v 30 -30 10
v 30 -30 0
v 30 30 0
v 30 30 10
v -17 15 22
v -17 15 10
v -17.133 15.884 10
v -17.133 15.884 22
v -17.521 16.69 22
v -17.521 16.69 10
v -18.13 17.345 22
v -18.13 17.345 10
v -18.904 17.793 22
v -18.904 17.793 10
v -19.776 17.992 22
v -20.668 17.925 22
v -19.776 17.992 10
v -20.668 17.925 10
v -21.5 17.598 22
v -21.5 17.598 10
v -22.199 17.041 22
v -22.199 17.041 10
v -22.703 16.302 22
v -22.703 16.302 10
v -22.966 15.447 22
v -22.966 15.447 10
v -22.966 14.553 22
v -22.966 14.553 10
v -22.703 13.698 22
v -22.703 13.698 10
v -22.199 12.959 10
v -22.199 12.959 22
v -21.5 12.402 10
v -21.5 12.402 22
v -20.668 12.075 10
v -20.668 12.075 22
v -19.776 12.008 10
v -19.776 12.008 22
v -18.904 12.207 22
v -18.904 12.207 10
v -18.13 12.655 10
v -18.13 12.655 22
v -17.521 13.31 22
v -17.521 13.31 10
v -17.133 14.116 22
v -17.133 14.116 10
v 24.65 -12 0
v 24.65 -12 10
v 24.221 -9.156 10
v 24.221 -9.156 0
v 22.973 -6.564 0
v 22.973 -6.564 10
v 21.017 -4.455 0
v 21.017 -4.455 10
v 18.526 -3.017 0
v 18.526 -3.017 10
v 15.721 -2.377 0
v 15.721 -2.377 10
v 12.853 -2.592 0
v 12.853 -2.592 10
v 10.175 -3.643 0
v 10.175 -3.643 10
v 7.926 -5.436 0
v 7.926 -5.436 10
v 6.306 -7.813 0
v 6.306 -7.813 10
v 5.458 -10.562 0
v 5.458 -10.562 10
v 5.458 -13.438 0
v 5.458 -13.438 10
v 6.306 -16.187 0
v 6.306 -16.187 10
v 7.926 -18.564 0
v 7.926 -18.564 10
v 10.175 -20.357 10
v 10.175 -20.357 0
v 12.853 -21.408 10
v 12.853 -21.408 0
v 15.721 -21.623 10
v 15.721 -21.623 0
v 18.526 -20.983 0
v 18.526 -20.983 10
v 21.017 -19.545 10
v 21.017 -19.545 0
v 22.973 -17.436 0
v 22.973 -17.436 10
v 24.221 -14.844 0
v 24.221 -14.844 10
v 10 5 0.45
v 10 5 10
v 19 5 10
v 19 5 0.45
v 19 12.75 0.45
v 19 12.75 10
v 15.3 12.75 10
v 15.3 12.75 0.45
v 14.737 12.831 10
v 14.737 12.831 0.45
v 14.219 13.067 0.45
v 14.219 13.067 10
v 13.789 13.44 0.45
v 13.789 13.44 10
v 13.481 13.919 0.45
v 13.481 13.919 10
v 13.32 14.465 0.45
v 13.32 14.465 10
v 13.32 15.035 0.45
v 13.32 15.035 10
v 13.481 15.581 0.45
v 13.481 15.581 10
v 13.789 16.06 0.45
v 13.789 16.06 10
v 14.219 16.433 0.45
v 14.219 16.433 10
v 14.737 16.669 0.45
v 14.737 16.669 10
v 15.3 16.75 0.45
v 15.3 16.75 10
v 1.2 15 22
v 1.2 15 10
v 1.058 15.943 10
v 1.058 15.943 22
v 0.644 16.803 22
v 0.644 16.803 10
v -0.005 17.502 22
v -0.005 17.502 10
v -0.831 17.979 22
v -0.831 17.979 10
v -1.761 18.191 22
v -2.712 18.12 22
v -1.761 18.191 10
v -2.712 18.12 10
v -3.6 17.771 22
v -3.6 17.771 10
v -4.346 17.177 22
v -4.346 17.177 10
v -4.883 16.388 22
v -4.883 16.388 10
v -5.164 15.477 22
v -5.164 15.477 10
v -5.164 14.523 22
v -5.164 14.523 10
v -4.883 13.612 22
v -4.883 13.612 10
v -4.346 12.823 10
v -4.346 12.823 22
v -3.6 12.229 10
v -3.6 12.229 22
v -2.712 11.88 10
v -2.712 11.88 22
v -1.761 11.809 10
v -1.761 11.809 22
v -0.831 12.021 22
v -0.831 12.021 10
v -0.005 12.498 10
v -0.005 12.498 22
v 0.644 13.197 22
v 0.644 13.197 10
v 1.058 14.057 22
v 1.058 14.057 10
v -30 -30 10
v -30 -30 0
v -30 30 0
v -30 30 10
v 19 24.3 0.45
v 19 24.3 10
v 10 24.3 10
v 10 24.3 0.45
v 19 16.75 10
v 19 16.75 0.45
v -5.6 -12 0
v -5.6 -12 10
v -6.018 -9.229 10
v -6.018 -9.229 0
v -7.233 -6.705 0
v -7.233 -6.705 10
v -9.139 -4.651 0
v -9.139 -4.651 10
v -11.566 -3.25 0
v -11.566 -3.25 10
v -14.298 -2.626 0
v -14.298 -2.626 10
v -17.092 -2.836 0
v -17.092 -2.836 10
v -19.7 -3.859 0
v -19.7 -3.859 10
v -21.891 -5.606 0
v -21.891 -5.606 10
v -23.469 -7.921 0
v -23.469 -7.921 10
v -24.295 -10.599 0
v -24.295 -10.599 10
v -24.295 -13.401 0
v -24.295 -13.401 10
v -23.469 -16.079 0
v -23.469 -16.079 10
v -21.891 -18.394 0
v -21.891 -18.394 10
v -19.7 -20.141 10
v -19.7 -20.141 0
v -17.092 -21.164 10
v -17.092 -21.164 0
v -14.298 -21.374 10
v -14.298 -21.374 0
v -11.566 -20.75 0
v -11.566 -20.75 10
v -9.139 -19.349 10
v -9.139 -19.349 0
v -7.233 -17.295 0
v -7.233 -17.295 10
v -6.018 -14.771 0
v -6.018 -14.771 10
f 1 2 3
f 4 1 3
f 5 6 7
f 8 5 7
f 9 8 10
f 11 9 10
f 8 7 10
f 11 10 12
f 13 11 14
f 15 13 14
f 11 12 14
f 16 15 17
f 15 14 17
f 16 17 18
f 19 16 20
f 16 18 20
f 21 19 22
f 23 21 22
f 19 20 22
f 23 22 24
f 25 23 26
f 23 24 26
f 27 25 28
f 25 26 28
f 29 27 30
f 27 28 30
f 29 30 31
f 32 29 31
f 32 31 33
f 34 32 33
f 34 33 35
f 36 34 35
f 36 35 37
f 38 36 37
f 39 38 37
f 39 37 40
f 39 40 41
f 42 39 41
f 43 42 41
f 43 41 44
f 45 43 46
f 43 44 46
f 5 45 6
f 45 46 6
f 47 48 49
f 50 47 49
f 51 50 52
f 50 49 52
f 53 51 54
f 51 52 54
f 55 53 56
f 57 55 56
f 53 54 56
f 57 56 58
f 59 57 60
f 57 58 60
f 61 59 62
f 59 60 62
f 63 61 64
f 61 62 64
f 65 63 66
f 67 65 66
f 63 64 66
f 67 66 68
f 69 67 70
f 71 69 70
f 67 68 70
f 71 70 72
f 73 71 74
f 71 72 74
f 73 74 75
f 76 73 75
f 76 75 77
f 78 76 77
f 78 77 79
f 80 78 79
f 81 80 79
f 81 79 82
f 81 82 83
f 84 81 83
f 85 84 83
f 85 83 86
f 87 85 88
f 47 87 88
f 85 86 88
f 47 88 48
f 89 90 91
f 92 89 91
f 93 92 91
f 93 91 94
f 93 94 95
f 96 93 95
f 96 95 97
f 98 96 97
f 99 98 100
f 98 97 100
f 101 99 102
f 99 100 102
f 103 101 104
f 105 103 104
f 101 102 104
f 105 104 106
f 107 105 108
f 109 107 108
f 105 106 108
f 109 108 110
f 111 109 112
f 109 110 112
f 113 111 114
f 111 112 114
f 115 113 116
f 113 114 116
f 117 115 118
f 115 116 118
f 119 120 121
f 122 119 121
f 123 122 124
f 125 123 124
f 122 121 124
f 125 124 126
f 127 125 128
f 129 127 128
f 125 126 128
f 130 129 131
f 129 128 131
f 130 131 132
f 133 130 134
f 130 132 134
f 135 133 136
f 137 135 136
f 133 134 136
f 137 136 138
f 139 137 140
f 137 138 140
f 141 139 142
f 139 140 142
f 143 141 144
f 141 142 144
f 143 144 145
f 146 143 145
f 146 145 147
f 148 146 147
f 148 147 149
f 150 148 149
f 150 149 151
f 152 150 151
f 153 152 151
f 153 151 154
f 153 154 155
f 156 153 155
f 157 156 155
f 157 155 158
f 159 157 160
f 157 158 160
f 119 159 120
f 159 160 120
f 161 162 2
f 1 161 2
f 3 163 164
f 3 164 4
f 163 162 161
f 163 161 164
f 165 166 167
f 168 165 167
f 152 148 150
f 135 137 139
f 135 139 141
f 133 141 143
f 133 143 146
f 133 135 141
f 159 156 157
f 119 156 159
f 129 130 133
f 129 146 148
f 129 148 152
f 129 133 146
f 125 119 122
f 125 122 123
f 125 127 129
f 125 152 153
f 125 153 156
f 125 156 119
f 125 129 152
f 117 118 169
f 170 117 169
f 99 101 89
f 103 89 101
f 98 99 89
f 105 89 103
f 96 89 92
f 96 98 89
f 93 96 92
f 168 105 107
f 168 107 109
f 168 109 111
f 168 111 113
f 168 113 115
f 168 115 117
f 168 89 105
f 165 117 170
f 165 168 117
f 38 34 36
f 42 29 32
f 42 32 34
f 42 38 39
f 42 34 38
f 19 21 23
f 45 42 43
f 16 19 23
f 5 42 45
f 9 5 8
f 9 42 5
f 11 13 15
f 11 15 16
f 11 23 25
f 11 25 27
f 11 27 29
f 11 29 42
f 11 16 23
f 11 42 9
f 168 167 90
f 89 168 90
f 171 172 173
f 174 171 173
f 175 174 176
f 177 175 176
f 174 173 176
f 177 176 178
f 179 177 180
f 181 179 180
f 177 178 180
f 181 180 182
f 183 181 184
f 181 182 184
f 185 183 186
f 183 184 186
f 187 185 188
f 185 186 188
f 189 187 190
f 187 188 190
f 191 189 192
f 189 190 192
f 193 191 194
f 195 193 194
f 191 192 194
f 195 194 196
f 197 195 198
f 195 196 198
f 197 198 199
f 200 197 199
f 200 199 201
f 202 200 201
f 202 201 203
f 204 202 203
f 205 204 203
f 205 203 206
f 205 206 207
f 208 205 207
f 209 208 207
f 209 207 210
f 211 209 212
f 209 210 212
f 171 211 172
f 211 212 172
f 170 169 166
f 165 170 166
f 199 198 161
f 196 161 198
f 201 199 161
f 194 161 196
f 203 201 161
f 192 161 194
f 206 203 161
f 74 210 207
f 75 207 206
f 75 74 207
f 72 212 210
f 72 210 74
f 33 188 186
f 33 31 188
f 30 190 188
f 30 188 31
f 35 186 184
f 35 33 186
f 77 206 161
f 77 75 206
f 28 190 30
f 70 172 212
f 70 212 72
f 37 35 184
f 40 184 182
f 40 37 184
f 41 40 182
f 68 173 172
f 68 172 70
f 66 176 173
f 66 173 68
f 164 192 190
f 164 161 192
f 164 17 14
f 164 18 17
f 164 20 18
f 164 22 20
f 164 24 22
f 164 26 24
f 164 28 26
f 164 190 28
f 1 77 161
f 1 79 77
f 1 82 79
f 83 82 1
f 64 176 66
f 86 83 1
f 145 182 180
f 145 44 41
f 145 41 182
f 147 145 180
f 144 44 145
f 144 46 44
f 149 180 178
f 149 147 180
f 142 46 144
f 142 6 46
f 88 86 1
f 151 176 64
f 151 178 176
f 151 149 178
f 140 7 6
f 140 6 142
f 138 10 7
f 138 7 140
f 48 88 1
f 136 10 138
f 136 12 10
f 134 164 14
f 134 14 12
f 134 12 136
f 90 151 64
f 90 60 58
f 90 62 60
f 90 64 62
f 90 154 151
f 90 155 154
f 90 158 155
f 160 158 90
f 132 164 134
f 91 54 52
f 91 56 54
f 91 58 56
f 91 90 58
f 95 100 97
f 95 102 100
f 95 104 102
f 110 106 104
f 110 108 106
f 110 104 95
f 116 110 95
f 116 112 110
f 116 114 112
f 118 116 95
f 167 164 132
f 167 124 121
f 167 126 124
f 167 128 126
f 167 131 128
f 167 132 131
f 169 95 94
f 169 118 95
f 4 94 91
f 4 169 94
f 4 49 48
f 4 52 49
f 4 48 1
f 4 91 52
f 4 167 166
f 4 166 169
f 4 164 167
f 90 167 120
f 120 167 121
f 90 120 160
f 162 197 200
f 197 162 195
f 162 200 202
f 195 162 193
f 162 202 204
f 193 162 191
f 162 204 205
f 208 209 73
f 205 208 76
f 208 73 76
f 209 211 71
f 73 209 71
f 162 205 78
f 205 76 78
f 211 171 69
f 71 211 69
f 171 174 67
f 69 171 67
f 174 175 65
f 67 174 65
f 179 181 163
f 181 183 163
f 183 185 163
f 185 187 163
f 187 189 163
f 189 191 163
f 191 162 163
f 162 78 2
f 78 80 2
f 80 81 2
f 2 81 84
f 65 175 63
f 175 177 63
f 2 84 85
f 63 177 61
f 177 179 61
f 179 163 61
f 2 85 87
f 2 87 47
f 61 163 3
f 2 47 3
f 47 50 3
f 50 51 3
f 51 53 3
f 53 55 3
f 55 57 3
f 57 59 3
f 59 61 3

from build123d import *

# Parameters (mm, degrees)
F0_W     = 60
F0_H     = 60
F1_DEPTH = 10
F2_R     = 3
F2_R_2   = 3.2
F3_DEPTH = 12
F4_R     = 9.4
F4_R_2   = 9.65
F5_DEPTH = 10
F7_DEPTH = 9.55


with BuildPart() as f1:
    # F0 (on Top) → F1 (new body)
    with BuildSketch(Plane.XY):
        Rectangle(F0_W, F0_H)
    extrude(amount=F1_DEPTH)

    # F2 (on face) → F3 (join)
    with BuildSketch(Plane.XY.offset(10)):
        with Locations((-20, 15)):
            Circle(F2_R)
        with Locations((-2, 15)):
            Circle(F2_R_2)
    extrude(amount=F3_DEPTH)

    # F4 (on face) → F5 (cut, through all)
    with BuildSketch(Plane.XY.offset(10)):
        with Locations((-15, -12)):
            Circle(F4_R)
        with Locations((15, -12)):
            Circle(F4_R_2)
    extrude(amount=-F5_DEPTH, mode=Mode.SUBTRACT)

    # F6 (on face) → F7 (cut)
    with BuildSketch(Plane.XY.offset(10)):
        with BuildLine():
            Line((19, 24.3), (10, 24.3))
            Line((10, 24.3), (10, 5))
            Line((10, 5), (19, 5))
            Line((19, 5), (19, 12.75))
            Line((19, 12.75), (15.3, 12.75))
            ThreePointArc((15.3, 12.75), (13.3, 14.75), (15.3, 16.75))
            Line((15.3, 16.75), (19, 16.75))
            Line((19, 16.75), (19, 24.3))
        make_face()
    extrude(amount=-F7_DEPTH, mode=Mode.SUBTRACT)


solid = f1.part
